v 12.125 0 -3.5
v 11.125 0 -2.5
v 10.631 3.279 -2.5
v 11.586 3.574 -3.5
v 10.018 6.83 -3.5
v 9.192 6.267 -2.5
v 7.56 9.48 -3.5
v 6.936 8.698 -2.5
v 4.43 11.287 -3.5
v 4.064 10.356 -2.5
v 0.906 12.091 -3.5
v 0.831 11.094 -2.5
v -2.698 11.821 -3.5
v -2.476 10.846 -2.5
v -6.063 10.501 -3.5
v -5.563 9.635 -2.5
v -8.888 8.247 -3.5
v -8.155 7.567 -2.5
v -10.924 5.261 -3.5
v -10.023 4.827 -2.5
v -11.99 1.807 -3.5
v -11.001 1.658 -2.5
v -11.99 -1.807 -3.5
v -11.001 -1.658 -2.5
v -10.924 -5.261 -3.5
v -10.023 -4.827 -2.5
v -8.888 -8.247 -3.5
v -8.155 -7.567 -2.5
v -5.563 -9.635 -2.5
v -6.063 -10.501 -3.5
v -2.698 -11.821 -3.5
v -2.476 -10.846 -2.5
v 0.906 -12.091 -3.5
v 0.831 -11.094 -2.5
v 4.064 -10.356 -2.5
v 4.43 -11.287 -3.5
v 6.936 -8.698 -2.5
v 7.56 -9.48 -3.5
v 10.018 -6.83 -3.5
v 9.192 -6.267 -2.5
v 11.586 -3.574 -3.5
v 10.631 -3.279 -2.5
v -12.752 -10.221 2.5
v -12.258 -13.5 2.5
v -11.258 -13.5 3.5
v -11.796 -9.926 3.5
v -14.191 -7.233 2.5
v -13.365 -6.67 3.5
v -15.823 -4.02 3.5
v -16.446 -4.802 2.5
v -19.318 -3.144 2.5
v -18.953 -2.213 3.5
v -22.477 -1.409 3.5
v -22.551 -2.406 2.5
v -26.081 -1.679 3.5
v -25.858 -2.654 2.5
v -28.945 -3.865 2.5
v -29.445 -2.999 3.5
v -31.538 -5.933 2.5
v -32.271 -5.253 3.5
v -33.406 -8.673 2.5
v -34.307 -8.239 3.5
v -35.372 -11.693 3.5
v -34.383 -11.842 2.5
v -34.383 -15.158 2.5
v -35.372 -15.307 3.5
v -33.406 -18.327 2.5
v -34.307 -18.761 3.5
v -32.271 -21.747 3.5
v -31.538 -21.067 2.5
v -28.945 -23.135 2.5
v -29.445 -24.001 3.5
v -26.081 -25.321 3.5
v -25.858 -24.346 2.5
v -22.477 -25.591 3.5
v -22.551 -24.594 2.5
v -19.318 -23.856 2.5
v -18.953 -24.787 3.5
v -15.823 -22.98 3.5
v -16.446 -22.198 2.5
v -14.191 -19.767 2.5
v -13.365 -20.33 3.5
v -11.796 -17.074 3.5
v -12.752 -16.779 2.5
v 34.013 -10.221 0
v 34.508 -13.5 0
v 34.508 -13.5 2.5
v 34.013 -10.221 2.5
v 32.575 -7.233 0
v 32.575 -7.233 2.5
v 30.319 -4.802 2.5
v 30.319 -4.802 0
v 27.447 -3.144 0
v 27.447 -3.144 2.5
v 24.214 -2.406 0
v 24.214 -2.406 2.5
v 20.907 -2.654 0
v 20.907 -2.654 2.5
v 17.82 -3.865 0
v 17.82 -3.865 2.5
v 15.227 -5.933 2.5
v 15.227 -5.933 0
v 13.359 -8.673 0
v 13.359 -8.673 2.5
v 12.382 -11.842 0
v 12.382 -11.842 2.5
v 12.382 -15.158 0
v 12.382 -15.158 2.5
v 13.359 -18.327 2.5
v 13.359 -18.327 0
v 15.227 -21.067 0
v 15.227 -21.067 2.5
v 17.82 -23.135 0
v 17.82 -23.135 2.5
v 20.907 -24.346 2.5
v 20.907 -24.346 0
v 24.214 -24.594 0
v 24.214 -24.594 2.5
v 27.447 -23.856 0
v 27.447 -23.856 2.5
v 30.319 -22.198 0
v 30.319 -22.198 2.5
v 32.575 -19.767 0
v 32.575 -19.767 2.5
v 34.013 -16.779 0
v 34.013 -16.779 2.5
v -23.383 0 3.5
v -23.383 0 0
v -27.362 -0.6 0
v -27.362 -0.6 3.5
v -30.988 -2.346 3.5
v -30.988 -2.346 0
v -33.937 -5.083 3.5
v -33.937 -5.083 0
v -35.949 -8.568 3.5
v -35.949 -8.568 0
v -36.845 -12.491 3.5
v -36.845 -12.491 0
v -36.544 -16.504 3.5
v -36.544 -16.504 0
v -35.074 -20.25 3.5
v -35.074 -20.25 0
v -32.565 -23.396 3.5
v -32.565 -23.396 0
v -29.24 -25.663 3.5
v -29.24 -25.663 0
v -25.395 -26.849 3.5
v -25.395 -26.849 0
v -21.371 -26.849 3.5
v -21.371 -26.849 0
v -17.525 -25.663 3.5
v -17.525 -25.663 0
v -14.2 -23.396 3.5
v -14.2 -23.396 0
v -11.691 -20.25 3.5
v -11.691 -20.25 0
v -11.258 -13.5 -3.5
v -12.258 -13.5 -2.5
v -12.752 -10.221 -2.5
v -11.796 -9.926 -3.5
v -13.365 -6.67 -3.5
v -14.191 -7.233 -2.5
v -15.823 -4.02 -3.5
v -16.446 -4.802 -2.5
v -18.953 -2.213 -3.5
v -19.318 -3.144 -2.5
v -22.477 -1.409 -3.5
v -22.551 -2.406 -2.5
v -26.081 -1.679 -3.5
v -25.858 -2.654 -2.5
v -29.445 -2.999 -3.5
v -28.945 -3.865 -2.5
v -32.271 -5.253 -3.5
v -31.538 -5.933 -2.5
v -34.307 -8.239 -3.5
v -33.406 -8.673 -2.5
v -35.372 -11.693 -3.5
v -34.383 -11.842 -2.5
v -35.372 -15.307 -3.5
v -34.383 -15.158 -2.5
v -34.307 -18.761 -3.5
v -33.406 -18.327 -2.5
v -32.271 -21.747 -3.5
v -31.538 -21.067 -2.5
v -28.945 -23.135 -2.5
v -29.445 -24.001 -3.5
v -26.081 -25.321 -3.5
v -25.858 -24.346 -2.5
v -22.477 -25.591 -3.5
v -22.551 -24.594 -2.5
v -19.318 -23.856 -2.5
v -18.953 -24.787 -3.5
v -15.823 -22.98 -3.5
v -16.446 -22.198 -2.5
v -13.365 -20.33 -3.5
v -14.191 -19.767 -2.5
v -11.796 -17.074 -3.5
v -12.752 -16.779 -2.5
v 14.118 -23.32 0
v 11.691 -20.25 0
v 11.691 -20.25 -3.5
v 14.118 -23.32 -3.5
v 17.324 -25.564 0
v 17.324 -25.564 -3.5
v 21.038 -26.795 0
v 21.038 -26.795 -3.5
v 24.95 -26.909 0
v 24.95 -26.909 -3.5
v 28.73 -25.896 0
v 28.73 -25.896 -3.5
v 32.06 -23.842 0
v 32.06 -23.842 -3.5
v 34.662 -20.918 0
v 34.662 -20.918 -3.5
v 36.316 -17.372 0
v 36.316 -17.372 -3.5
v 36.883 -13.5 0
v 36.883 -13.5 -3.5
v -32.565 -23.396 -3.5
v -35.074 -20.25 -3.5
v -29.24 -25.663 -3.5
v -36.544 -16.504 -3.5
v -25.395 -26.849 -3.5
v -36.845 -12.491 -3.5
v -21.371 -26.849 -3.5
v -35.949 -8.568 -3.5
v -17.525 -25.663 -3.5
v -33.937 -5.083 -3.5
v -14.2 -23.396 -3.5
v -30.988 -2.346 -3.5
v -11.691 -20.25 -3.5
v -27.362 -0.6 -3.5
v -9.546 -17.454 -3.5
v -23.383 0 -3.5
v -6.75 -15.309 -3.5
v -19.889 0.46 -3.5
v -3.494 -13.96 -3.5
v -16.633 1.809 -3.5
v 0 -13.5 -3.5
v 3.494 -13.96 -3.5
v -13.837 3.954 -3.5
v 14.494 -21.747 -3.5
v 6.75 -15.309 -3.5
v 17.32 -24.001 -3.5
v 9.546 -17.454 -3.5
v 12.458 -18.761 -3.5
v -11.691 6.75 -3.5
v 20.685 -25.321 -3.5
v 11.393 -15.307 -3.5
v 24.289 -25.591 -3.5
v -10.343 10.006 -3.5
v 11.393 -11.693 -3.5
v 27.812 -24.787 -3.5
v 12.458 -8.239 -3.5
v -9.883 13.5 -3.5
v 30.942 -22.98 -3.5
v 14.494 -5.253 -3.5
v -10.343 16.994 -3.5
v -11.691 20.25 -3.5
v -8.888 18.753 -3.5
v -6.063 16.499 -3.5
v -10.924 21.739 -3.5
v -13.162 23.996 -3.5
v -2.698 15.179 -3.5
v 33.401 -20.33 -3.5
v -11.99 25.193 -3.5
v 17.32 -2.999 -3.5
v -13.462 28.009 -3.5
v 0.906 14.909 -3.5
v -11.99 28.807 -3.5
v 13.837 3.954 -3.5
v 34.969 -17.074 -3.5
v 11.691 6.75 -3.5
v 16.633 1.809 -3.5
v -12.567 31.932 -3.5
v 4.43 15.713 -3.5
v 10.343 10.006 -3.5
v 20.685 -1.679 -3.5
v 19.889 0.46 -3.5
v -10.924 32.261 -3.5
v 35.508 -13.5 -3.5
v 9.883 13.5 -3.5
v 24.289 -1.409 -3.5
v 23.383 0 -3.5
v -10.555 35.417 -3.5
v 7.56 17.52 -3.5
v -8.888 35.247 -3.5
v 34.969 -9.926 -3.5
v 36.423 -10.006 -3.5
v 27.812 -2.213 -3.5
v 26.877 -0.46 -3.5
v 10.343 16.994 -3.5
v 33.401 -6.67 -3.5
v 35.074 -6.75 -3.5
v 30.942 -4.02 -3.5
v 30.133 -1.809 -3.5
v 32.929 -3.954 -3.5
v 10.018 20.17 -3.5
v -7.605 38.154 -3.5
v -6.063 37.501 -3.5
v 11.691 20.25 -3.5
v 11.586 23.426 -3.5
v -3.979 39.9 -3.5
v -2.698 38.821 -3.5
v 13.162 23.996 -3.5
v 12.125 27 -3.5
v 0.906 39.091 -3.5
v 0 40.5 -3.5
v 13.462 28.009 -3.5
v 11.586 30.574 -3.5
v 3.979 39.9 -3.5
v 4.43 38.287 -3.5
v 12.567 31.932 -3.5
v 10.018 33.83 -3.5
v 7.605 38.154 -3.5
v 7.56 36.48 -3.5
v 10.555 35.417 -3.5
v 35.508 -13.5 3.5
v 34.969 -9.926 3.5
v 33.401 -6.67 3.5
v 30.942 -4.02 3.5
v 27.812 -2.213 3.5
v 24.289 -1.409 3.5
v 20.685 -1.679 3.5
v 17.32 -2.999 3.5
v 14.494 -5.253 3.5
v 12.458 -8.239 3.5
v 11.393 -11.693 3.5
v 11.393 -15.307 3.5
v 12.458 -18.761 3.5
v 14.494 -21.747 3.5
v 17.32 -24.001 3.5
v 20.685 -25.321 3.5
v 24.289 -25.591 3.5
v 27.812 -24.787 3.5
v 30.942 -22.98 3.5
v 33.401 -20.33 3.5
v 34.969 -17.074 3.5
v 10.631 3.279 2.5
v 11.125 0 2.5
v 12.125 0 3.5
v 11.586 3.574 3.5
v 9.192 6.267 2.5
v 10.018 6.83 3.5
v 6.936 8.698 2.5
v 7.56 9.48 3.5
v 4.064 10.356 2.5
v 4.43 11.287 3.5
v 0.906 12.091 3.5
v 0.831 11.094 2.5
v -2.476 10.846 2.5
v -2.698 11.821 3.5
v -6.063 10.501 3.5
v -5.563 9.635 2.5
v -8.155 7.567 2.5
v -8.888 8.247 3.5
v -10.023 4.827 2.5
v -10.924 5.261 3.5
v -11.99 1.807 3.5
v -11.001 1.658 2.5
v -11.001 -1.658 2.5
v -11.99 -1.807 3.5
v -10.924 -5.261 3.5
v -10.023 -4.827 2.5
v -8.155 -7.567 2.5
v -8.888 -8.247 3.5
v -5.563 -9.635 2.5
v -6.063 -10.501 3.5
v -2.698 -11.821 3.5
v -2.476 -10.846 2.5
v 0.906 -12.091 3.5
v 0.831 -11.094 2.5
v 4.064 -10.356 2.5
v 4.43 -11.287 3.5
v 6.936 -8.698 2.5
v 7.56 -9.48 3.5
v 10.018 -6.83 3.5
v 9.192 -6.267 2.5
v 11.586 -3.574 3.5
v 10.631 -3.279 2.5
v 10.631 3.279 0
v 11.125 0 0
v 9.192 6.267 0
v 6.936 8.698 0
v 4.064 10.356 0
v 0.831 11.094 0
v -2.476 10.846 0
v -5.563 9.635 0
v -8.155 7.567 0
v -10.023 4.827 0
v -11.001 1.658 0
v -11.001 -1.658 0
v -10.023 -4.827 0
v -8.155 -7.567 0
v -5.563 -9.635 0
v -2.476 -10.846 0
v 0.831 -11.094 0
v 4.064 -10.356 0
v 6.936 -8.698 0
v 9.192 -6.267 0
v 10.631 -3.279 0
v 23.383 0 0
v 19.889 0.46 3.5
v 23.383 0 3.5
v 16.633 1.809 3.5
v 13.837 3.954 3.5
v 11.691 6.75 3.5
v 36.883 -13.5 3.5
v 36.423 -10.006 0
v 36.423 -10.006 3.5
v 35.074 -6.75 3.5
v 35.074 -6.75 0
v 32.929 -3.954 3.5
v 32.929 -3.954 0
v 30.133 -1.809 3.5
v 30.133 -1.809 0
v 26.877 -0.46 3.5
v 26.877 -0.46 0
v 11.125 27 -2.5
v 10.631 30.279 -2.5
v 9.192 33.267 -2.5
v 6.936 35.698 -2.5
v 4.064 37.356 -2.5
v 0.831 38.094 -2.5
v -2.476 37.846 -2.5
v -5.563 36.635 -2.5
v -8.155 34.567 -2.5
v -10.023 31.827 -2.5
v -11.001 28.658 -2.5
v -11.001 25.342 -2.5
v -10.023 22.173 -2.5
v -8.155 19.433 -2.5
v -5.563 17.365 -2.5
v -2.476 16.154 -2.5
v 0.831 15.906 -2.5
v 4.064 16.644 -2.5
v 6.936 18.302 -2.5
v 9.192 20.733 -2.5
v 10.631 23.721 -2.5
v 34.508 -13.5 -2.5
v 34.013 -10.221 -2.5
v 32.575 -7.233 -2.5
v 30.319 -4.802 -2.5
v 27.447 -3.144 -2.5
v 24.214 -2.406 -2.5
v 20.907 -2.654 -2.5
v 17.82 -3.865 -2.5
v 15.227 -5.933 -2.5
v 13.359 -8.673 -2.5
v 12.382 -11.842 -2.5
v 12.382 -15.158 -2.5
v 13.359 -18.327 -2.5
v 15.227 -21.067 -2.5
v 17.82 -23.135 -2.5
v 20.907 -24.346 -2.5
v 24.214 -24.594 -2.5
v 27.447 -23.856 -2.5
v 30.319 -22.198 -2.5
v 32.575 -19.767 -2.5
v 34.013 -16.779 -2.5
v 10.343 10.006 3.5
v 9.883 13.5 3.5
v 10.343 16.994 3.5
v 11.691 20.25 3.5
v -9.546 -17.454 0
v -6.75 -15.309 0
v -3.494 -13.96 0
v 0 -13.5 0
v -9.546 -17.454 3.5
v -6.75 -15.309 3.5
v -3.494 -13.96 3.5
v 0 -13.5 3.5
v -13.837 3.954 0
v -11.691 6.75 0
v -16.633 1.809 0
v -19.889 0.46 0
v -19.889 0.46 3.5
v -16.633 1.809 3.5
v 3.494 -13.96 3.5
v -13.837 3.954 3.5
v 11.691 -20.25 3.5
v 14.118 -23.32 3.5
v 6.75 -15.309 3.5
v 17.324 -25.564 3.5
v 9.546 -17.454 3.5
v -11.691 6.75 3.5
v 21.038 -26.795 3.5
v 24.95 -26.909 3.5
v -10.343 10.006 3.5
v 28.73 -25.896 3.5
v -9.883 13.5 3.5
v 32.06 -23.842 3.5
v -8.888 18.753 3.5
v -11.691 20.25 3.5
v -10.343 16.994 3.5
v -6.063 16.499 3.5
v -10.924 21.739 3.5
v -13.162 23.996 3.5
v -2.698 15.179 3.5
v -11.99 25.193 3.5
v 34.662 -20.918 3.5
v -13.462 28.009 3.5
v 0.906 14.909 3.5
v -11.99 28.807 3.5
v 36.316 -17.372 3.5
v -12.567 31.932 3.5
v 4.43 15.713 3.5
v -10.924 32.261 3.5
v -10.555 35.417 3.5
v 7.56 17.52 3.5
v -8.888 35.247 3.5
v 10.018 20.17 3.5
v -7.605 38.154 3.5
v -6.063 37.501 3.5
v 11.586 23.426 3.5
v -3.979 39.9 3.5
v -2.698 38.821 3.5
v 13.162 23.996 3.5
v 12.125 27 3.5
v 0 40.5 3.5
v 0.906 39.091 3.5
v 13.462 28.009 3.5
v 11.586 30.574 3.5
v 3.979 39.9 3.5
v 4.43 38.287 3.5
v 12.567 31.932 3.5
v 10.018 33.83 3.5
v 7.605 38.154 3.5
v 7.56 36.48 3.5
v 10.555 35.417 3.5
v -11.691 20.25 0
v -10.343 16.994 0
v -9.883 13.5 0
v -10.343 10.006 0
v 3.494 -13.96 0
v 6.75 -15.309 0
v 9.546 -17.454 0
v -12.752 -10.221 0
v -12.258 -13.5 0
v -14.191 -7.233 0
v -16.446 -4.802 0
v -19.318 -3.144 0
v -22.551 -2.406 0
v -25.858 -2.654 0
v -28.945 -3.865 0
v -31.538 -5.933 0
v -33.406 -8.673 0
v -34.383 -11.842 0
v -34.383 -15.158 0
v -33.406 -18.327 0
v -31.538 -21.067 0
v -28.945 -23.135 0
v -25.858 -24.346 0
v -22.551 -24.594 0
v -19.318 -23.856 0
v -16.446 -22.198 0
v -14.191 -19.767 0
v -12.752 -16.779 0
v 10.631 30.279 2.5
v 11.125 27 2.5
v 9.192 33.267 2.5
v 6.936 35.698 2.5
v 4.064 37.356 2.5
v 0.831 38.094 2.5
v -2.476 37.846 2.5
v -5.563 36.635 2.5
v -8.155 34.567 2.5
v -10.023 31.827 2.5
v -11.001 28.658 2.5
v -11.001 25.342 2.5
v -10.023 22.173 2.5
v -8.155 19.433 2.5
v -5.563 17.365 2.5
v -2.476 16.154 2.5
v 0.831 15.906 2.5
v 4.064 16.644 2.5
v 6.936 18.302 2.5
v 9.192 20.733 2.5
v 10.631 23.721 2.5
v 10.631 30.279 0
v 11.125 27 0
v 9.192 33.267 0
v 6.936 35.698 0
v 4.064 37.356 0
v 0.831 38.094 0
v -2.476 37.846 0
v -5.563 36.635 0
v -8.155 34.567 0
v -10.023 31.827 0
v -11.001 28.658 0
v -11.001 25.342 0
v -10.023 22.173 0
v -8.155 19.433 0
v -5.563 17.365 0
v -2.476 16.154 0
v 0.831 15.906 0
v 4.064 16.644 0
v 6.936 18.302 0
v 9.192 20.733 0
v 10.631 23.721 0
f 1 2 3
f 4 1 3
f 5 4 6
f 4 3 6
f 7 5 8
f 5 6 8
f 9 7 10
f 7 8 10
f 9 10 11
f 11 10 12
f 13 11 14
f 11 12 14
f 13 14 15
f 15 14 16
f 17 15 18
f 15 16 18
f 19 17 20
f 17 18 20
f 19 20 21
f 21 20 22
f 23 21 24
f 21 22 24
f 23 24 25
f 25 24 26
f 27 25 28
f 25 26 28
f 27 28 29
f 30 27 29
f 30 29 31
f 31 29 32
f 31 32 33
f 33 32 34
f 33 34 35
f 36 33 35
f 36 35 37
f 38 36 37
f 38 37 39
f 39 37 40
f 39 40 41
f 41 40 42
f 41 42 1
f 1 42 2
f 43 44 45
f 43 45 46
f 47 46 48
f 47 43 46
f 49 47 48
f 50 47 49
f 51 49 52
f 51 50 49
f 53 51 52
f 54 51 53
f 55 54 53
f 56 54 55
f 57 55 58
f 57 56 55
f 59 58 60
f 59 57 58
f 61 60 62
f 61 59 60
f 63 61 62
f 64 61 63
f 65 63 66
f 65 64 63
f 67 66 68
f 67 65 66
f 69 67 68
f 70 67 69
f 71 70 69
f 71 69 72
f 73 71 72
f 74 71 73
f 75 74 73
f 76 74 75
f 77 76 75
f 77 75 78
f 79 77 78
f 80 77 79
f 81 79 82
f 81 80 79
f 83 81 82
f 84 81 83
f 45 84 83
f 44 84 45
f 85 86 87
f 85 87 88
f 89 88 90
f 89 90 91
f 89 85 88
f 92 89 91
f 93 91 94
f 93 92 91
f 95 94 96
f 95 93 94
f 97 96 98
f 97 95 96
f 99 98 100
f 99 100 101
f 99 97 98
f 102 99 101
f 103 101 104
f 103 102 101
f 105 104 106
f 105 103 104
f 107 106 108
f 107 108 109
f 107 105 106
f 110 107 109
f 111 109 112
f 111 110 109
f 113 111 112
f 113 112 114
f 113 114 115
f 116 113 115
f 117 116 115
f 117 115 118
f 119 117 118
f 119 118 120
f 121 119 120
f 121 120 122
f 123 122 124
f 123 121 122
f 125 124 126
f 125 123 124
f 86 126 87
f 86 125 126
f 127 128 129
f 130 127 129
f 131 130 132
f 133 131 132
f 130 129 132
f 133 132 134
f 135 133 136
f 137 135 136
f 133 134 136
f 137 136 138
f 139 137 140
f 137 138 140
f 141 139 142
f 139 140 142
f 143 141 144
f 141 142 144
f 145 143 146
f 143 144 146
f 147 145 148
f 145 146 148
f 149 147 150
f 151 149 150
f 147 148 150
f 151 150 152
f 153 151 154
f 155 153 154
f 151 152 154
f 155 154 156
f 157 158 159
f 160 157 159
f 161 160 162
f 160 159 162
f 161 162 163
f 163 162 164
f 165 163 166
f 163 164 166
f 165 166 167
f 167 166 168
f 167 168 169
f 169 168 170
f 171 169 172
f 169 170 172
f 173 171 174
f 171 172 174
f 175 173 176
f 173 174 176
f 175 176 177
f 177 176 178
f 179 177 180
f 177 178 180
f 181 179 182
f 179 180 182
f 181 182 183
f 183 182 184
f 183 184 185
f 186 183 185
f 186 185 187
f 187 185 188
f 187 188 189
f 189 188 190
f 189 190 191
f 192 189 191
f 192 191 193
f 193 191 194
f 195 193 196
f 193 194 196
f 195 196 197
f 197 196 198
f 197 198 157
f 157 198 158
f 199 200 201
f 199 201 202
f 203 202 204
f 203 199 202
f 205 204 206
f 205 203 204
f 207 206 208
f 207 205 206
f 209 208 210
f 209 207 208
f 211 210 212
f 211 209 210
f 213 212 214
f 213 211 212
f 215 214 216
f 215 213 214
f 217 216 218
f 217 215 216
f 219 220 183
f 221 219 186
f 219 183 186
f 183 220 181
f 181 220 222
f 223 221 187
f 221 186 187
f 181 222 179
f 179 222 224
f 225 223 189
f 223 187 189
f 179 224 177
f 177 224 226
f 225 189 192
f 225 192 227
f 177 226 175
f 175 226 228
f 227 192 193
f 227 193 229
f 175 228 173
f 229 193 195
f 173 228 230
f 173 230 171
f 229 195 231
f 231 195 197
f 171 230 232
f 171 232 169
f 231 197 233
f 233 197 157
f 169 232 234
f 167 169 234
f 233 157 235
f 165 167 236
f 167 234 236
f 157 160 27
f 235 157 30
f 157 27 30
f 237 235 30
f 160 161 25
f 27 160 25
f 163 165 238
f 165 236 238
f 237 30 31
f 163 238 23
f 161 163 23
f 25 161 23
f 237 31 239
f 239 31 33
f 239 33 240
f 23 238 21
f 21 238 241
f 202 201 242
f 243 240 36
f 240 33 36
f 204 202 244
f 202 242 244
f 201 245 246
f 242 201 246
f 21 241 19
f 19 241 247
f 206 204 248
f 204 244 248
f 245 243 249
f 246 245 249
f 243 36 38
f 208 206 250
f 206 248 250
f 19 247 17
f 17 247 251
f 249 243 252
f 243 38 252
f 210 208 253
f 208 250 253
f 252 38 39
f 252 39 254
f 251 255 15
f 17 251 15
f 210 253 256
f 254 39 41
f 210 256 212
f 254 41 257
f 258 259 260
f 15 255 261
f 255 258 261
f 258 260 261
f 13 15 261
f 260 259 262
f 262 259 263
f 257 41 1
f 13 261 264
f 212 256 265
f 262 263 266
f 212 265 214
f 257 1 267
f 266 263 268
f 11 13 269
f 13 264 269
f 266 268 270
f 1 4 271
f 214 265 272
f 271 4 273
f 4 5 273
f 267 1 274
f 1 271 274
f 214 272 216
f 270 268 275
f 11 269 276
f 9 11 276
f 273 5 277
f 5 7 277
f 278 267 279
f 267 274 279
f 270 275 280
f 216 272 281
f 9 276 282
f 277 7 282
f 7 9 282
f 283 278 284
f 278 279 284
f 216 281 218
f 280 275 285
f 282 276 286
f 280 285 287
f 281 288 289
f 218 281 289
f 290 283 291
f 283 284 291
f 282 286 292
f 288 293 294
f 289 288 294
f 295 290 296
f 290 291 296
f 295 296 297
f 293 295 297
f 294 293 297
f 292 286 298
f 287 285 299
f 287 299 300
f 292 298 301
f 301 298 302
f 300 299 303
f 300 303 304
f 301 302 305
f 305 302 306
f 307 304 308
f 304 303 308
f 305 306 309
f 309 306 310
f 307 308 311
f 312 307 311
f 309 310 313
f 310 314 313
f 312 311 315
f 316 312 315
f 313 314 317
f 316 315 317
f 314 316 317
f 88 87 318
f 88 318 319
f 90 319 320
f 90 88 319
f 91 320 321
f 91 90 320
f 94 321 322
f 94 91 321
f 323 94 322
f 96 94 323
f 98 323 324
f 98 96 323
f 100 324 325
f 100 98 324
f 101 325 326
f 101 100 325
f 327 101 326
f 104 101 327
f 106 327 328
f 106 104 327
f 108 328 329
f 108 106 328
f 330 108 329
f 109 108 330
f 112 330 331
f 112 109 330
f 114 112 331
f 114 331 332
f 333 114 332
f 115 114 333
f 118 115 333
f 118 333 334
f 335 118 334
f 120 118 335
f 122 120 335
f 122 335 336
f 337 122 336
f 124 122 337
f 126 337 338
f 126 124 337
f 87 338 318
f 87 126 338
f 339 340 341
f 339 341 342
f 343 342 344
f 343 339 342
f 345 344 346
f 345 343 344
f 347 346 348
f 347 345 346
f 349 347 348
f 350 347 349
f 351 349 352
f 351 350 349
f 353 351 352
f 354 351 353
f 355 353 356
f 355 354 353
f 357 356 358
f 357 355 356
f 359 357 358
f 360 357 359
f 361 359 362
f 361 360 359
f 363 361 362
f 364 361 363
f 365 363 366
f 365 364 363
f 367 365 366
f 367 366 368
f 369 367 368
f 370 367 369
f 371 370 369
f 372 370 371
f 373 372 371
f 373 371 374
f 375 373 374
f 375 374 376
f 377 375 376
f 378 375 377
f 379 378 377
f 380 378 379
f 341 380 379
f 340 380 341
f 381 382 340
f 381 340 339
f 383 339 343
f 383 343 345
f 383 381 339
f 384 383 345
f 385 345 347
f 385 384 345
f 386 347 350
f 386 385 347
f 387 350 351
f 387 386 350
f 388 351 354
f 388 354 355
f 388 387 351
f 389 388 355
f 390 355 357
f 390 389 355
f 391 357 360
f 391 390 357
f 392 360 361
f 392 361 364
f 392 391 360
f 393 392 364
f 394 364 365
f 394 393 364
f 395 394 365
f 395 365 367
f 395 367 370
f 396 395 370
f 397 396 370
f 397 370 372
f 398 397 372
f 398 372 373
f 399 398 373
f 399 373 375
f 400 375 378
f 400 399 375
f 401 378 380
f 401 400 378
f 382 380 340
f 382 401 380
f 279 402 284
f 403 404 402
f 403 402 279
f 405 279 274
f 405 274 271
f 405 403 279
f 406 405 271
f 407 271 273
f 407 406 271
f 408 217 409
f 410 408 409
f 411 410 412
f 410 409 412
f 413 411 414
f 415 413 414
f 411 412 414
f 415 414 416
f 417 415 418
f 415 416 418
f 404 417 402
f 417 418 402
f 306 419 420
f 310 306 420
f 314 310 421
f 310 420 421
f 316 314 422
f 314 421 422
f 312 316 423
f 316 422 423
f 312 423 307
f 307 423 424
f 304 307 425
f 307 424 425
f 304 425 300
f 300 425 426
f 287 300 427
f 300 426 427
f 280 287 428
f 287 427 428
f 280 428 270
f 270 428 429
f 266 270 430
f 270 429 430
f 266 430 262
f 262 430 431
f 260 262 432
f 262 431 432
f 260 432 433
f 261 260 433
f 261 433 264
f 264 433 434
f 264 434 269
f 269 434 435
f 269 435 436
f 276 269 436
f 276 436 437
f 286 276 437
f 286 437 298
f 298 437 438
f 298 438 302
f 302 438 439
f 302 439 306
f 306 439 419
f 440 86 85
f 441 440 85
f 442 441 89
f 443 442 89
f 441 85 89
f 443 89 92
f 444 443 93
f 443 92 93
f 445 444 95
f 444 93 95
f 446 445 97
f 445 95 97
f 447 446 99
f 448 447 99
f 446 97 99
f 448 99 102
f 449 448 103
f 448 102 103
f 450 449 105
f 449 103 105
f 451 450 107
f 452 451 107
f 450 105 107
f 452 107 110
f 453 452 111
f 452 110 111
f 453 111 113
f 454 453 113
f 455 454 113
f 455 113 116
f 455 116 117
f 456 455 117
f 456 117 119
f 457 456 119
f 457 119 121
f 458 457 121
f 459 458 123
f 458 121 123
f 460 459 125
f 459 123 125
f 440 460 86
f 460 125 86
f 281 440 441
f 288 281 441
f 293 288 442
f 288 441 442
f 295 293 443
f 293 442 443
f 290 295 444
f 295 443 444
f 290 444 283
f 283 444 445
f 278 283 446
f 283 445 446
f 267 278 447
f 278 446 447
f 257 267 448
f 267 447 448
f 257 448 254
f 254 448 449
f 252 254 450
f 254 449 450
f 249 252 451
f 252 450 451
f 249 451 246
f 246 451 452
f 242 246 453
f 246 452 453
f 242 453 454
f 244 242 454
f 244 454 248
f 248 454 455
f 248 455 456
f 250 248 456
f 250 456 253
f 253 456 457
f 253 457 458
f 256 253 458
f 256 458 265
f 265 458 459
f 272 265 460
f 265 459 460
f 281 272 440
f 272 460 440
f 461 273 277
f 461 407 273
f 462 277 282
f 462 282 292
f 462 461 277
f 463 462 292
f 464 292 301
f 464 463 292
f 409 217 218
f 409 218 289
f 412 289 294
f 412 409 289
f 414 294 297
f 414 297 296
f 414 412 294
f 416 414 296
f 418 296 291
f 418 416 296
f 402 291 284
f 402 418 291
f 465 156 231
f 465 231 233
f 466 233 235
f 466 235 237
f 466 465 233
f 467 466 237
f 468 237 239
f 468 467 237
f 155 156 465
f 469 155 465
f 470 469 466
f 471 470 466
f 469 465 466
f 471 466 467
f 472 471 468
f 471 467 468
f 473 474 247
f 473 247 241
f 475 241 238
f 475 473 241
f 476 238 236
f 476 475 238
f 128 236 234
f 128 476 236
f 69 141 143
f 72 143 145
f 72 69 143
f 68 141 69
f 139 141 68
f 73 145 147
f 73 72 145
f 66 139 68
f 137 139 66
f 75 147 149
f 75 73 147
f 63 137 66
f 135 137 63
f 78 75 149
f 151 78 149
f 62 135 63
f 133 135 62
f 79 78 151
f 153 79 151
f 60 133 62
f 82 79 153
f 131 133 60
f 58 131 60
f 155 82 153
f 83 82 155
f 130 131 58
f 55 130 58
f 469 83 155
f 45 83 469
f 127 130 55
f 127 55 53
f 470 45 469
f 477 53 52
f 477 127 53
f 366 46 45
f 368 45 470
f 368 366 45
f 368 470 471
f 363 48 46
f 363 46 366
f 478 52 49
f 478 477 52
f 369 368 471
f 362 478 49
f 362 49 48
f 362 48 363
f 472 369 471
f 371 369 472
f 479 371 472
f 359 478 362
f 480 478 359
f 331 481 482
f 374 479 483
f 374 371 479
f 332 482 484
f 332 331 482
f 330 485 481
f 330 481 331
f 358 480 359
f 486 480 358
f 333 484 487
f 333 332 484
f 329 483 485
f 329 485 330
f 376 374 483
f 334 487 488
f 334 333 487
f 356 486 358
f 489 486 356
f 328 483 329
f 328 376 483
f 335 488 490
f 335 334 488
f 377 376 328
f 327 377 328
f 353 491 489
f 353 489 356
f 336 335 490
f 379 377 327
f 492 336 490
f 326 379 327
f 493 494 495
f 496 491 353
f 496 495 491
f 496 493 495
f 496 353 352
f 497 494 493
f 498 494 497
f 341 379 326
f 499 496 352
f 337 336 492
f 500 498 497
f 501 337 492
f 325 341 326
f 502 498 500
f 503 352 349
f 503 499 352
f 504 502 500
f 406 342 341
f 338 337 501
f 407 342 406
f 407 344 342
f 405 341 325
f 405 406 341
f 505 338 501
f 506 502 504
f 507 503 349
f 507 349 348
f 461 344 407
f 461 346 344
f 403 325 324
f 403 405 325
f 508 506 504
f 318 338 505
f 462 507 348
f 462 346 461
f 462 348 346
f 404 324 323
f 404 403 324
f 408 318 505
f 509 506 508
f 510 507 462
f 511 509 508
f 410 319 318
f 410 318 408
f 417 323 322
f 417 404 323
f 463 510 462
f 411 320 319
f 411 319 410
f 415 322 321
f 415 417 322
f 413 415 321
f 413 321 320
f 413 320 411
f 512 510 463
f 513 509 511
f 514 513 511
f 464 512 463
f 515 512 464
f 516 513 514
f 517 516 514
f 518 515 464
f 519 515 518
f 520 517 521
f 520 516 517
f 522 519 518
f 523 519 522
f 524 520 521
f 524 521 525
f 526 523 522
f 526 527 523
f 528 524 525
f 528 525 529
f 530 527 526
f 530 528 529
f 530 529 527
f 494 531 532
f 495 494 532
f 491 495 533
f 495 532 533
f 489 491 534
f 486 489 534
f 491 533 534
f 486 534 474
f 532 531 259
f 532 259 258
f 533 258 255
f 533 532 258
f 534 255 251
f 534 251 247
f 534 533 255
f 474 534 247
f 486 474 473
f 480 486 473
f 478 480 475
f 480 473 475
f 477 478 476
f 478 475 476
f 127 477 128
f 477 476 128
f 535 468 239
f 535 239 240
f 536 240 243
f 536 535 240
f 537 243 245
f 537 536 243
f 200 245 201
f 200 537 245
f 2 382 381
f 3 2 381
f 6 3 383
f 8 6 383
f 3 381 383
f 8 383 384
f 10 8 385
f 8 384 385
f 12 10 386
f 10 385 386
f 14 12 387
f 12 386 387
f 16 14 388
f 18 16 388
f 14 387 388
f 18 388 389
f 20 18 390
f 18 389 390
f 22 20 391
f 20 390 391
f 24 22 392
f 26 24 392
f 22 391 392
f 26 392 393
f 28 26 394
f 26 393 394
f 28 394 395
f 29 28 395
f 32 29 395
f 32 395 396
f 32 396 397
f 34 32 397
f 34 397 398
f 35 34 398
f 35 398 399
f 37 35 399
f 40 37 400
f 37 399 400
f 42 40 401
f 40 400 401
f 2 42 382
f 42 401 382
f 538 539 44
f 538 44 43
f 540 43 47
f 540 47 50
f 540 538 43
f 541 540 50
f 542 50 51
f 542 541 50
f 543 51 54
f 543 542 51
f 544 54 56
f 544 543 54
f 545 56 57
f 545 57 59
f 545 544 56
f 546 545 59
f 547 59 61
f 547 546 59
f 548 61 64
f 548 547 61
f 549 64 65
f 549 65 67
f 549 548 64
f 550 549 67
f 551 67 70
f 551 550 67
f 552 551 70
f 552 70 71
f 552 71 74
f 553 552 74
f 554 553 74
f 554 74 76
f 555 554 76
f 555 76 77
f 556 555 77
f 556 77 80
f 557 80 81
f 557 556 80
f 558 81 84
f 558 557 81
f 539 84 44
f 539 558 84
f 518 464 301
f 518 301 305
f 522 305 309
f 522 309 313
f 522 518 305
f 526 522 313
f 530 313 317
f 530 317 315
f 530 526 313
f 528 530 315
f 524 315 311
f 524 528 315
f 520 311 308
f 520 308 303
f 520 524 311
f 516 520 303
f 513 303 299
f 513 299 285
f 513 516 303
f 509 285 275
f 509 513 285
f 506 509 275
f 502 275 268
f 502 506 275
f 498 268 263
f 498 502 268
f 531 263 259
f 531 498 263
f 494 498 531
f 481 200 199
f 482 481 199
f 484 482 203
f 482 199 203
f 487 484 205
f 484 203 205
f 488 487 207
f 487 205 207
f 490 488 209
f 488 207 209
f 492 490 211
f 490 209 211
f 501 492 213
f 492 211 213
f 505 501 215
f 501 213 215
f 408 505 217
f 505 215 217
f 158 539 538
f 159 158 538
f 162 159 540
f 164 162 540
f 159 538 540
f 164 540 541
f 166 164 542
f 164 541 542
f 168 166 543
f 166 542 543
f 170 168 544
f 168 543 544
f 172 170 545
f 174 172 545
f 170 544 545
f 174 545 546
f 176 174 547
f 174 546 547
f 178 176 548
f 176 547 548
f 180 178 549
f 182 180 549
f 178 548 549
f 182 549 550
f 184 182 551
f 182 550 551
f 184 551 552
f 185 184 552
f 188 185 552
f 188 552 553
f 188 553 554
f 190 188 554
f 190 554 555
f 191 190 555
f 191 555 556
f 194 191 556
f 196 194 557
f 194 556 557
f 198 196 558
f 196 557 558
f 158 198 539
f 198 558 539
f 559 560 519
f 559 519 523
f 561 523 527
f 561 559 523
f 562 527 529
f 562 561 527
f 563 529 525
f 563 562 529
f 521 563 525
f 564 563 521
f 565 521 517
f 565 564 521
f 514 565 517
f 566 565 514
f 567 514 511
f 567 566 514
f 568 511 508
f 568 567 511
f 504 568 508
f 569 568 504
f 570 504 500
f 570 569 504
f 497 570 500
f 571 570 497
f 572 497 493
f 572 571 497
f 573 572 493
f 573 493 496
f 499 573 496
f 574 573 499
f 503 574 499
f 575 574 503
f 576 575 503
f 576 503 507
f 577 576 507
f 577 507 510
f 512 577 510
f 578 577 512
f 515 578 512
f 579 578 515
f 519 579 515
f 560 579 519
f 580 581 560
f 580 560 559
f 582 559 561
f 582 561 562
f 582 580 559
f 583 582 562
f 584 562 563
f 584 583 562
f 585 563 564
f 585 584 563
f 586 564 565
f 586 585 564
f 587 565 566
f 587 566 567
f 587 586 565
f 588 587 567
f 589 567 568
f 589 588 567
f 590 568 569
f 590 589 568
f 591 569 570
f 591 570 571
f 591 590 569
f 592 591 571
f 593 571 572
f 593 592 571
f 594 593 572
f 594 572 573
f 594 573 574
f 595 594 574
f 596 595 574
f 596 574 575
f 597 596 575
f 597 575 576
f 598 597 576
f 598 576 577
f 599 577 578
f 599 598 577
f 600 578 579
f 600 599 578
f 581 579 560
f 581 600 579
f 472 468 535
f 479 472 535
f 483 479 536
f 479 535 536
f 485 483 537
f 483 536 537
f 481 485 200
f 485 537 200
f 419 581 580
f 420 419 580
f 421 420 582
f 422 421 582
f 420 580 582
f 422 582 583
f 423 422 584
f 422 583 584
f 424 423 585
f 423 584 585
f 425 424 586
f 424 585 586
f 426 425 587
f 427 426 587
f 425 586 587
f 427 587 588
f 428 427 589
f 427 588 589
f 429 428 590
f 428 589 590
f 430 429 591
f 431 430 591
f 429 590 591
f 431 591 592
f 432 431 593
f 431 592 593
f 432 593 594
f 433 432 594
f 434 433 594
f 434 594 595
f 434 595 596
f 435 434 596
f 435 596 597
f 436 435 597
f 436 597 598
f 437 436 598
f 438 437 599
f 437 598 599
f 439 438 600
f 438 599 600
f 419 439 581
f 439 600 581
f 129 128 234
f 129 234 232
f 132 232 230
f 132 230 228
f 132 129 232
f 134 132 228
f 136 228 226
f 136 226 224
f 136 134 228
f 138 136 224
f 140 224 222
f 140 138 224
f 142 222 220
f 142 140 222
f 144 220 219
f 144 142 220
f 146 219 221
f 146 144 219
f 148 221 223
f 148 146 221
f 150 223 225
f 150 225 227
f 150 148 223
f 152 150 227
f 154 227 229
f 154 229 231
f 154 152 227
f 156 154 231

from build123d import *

# Parameters (mm, degrees)
F0_R     = 11.125
F1_DEPTH = 3.5
F2_SIZE  = 1
F3_SIZE  = 1


# Not quite as in the source:
# - a feature names something its author has since deleted; it is built from what else it names


with BuildPart() as f1:
    # F0 (on Top) → F1 (new body, symmetric)
    with BuildSketch(Plane.XY):
        with BuildLine():
            ThreePointArc((-1.36e-08, 13.5), (6.7500001307, 11.6913428757), (11.6913431087, 6.7499997269))
            ThreePointArc((11.6913431087, 6.7499997269), (9.8826859022, 13.4999998423), (11.6913429511, 20.25))
            ThreePointArc((11.6913429511, 20.25), (6.7499999941, 15.3086570455), (-1.36e-08, 13.5))
        make_face()
        with BuildLine():
            ThreePointArc((-11.691342964, 6.7499999776), (-6.7500000171, 11.6913429412), (-1.36e-08, 13.5))
            ThreePointArc((-1.36e-08, 13.5), (-6.7500000059, 15.3086570523), (-11.6913429511, 20.25))
            ThreePointArc((-11.6913429511, 20.25), (-9.8826859022, 13.4999999871), (-11.691342964, 6.7499999776))
        make_face()
        with BuildLine():
            ThreePointArc((-11.6913429875, -6.749999937), (-13.5, 2.34e-08), (-11.691342964, 6.7499999776))
            ThreePointArc((-11.691342964, 6.7499999776), (-16.6326859134, 1.8086570424), (-23.3826859022, 0))
            ThreePointArc((-23.3826859022, 0), (-16.6326859337, -1.8086570307), (-11.6913429875, -6.749999937))
        make_face()
        with BuildLine():
            ThreePointArc((-11.6913429511, -20.25), (-6.7500000035, -15.3086570509), (-8.1e-09, -13.5))
            ThreePointArc((-8.1e-09, -13.5), (-6.750000035, -11.6913429309), (-11.6913429875, -6.749999937))
            ThreePointArc((-11.6913429875, -6.749999937), (-10.3426872567, -10.005942856), (-9.8826859022, -13.5))
            ThreePointArc((-9.8826859022, -13.5), (-10.3426872473, -16.9940571089), (-11.6913429511, -20.25))
        make_face()
        with BuildLine():
            ThreePointArc((11.6913429511, -20.25), (9.8826859022, -13.5000001869), (11.6913427641, -6.7500003238))
            ThreePointArc((11.6913427641, -6.7500003238), (6.7499998346, -11.6913430466), (-8.1e-09, -13.5))
            ThreePointArc((-8.1e-09, -13.5), (6.7499999965, -15.3086570469), (11.6913429511, -20.25))
        make_face()
        with BuildLine():
            ThreePointArc((11.6913431087, 6.7499997269), (13.0399986957, 3.4940569566), (13.5, 0))
            ThreePointArc((13.5, 0), (13.0399986065, -3.4940572895), (11.6913427641, -6.7500003238))
            ThreePointArc((11.6913427641, -6.7500003238), (16.6326857403, -1.8086571424), (23.3826859022, 0))
            ThreePointArc((23.3826859022, 0), (16.6326860387, 1.8086569701), (11.6913431087, 6.7499997269))
        make_face()
        with BuildLine():
            ThreePointArc((11.6913427641, -6.7500003238), (13.0399986065, -3.4940572895), (13.5, 0))
            ThreePointArc((13.5, 0), (13.0399986957, 3.4940569566), (11.6913431087, 6.7499997269))
            ThreePointArc((11.6913431087, 6.7499997269), (6.7500001307, 11.6913428757), (-1.36e-08, 13.5))
            ThreePointArc((-1.36e-08, 13.5), (-6.7500000171, 11.6913429412), (-11.691342964, 6.7499999776))
            ThreePointArc((-11.691342964, 6.7499999776), (-13.5, 2.34e-08), (-11.6913429875, -6.749999937))
            ThreePointArc((-11.6913429875, -6.749999937), (-6.750000035, -11.6913429309), (-8.1e-09, -13.5))
            ThreePointArc((-8.1e-09, -13.5), (6.7499998346, -11.6913430466), (11.6913427641, -6.7500003238))
        make_face()
        Circle(F0_R, mode=Mode.SUBTRACT)
        with BuildLine():
            ThreePointArc((-11.6913429511, 20.25), (-6.7500000059, 15.3086570523), (-1.36e-08, 13.5))
            ThreePointArc((-1.36e-08, 13.5), (6.7499999941, 15.3086570455), (11.6913429511, 20.25))
            ThreePointArc((11.6913429511, 20.25), (13.0399986549, 23.5059428911), (13.5, 27))
            ThreePointArc((13.5, 27), (-3.4940571089, 40.0399986549), (-11.6913429511, 20.25))
        make_face()
        with Locations((0, 27)):
            Circle(F0_R, mode=Mode.SUBTRACT)
        with BuildLine():
            ThreePointArc((-9.8826859022, -13.5), (-10.3426872567, -10.005942856), (-11.6913429875, -6.749999937))
            ThreePointArc((-11.6913429875, -6.749999937), (-16.6326859337, -1.8086570307), (-23.3826859022, 0))
            ThreePointArc((-23.3826859022, 0), (-35.0740288533, -20.25), (-11.6913429511, -20.25))
            ThreePointArc((-11.6913429511, -20.25), (-10.3426872473, -16.9940571089), (-9.8826859022, -13.5))
        make_face()
        with Locations((-23.3826859022, -13.5)):
            Circle(F0_R, mode=Mode.SUBTRACT)
        with BuildLine():
            ThreePointArc((23.3826859022, 0), (16.6326857403, -1.8086571424), (11.6913427641, -6.7500003238))
            ThreePointArc((11.6913427641, -6.7500003238), (9.8826859022, -13.5000001869), (11.6913429511, -20.25))
            ThreePointArc((11.6913429511, -20.25), (26.8767430111, -26.5399986549), (36.8826859022, -13.5))
            ThreePointArc((36.8826859022, -13.5), (32.9286274482, -3.954058454), (23.3826859022, 0))
        make_face()
        with Locations((23.3826859022, -13.5)):
            Circle(F0_R, mode=Mode.SUBTRACT)
    extrude(amount=F1_DEPTH, both=True)

    # F2
    f2_edges = [f1.edges().sort_by_distance(p)[0] for p in [
        (-11.125, 0, 3.5),
        (-11.125, 27, 3.5),
        (-34.507686, -13.5, 3.5),
        (12.257686, -13.5, 3.5),
    ]]
    chamfer(f2_edges, length=F2_SIZE)

    # F3
    f3_edges = [f1.edges().sort_by_distance(p)[0] for p in [
        (-11.125, 0, -3.5),
        (-11.125, 27, -3.5),
        (-34.507686, -13.5, -3.5),
        (12.257686, -13.5, -3.5),
    ]]
    chamfer(f3_edges, length=F3_SIZE)


solid = f1.part
